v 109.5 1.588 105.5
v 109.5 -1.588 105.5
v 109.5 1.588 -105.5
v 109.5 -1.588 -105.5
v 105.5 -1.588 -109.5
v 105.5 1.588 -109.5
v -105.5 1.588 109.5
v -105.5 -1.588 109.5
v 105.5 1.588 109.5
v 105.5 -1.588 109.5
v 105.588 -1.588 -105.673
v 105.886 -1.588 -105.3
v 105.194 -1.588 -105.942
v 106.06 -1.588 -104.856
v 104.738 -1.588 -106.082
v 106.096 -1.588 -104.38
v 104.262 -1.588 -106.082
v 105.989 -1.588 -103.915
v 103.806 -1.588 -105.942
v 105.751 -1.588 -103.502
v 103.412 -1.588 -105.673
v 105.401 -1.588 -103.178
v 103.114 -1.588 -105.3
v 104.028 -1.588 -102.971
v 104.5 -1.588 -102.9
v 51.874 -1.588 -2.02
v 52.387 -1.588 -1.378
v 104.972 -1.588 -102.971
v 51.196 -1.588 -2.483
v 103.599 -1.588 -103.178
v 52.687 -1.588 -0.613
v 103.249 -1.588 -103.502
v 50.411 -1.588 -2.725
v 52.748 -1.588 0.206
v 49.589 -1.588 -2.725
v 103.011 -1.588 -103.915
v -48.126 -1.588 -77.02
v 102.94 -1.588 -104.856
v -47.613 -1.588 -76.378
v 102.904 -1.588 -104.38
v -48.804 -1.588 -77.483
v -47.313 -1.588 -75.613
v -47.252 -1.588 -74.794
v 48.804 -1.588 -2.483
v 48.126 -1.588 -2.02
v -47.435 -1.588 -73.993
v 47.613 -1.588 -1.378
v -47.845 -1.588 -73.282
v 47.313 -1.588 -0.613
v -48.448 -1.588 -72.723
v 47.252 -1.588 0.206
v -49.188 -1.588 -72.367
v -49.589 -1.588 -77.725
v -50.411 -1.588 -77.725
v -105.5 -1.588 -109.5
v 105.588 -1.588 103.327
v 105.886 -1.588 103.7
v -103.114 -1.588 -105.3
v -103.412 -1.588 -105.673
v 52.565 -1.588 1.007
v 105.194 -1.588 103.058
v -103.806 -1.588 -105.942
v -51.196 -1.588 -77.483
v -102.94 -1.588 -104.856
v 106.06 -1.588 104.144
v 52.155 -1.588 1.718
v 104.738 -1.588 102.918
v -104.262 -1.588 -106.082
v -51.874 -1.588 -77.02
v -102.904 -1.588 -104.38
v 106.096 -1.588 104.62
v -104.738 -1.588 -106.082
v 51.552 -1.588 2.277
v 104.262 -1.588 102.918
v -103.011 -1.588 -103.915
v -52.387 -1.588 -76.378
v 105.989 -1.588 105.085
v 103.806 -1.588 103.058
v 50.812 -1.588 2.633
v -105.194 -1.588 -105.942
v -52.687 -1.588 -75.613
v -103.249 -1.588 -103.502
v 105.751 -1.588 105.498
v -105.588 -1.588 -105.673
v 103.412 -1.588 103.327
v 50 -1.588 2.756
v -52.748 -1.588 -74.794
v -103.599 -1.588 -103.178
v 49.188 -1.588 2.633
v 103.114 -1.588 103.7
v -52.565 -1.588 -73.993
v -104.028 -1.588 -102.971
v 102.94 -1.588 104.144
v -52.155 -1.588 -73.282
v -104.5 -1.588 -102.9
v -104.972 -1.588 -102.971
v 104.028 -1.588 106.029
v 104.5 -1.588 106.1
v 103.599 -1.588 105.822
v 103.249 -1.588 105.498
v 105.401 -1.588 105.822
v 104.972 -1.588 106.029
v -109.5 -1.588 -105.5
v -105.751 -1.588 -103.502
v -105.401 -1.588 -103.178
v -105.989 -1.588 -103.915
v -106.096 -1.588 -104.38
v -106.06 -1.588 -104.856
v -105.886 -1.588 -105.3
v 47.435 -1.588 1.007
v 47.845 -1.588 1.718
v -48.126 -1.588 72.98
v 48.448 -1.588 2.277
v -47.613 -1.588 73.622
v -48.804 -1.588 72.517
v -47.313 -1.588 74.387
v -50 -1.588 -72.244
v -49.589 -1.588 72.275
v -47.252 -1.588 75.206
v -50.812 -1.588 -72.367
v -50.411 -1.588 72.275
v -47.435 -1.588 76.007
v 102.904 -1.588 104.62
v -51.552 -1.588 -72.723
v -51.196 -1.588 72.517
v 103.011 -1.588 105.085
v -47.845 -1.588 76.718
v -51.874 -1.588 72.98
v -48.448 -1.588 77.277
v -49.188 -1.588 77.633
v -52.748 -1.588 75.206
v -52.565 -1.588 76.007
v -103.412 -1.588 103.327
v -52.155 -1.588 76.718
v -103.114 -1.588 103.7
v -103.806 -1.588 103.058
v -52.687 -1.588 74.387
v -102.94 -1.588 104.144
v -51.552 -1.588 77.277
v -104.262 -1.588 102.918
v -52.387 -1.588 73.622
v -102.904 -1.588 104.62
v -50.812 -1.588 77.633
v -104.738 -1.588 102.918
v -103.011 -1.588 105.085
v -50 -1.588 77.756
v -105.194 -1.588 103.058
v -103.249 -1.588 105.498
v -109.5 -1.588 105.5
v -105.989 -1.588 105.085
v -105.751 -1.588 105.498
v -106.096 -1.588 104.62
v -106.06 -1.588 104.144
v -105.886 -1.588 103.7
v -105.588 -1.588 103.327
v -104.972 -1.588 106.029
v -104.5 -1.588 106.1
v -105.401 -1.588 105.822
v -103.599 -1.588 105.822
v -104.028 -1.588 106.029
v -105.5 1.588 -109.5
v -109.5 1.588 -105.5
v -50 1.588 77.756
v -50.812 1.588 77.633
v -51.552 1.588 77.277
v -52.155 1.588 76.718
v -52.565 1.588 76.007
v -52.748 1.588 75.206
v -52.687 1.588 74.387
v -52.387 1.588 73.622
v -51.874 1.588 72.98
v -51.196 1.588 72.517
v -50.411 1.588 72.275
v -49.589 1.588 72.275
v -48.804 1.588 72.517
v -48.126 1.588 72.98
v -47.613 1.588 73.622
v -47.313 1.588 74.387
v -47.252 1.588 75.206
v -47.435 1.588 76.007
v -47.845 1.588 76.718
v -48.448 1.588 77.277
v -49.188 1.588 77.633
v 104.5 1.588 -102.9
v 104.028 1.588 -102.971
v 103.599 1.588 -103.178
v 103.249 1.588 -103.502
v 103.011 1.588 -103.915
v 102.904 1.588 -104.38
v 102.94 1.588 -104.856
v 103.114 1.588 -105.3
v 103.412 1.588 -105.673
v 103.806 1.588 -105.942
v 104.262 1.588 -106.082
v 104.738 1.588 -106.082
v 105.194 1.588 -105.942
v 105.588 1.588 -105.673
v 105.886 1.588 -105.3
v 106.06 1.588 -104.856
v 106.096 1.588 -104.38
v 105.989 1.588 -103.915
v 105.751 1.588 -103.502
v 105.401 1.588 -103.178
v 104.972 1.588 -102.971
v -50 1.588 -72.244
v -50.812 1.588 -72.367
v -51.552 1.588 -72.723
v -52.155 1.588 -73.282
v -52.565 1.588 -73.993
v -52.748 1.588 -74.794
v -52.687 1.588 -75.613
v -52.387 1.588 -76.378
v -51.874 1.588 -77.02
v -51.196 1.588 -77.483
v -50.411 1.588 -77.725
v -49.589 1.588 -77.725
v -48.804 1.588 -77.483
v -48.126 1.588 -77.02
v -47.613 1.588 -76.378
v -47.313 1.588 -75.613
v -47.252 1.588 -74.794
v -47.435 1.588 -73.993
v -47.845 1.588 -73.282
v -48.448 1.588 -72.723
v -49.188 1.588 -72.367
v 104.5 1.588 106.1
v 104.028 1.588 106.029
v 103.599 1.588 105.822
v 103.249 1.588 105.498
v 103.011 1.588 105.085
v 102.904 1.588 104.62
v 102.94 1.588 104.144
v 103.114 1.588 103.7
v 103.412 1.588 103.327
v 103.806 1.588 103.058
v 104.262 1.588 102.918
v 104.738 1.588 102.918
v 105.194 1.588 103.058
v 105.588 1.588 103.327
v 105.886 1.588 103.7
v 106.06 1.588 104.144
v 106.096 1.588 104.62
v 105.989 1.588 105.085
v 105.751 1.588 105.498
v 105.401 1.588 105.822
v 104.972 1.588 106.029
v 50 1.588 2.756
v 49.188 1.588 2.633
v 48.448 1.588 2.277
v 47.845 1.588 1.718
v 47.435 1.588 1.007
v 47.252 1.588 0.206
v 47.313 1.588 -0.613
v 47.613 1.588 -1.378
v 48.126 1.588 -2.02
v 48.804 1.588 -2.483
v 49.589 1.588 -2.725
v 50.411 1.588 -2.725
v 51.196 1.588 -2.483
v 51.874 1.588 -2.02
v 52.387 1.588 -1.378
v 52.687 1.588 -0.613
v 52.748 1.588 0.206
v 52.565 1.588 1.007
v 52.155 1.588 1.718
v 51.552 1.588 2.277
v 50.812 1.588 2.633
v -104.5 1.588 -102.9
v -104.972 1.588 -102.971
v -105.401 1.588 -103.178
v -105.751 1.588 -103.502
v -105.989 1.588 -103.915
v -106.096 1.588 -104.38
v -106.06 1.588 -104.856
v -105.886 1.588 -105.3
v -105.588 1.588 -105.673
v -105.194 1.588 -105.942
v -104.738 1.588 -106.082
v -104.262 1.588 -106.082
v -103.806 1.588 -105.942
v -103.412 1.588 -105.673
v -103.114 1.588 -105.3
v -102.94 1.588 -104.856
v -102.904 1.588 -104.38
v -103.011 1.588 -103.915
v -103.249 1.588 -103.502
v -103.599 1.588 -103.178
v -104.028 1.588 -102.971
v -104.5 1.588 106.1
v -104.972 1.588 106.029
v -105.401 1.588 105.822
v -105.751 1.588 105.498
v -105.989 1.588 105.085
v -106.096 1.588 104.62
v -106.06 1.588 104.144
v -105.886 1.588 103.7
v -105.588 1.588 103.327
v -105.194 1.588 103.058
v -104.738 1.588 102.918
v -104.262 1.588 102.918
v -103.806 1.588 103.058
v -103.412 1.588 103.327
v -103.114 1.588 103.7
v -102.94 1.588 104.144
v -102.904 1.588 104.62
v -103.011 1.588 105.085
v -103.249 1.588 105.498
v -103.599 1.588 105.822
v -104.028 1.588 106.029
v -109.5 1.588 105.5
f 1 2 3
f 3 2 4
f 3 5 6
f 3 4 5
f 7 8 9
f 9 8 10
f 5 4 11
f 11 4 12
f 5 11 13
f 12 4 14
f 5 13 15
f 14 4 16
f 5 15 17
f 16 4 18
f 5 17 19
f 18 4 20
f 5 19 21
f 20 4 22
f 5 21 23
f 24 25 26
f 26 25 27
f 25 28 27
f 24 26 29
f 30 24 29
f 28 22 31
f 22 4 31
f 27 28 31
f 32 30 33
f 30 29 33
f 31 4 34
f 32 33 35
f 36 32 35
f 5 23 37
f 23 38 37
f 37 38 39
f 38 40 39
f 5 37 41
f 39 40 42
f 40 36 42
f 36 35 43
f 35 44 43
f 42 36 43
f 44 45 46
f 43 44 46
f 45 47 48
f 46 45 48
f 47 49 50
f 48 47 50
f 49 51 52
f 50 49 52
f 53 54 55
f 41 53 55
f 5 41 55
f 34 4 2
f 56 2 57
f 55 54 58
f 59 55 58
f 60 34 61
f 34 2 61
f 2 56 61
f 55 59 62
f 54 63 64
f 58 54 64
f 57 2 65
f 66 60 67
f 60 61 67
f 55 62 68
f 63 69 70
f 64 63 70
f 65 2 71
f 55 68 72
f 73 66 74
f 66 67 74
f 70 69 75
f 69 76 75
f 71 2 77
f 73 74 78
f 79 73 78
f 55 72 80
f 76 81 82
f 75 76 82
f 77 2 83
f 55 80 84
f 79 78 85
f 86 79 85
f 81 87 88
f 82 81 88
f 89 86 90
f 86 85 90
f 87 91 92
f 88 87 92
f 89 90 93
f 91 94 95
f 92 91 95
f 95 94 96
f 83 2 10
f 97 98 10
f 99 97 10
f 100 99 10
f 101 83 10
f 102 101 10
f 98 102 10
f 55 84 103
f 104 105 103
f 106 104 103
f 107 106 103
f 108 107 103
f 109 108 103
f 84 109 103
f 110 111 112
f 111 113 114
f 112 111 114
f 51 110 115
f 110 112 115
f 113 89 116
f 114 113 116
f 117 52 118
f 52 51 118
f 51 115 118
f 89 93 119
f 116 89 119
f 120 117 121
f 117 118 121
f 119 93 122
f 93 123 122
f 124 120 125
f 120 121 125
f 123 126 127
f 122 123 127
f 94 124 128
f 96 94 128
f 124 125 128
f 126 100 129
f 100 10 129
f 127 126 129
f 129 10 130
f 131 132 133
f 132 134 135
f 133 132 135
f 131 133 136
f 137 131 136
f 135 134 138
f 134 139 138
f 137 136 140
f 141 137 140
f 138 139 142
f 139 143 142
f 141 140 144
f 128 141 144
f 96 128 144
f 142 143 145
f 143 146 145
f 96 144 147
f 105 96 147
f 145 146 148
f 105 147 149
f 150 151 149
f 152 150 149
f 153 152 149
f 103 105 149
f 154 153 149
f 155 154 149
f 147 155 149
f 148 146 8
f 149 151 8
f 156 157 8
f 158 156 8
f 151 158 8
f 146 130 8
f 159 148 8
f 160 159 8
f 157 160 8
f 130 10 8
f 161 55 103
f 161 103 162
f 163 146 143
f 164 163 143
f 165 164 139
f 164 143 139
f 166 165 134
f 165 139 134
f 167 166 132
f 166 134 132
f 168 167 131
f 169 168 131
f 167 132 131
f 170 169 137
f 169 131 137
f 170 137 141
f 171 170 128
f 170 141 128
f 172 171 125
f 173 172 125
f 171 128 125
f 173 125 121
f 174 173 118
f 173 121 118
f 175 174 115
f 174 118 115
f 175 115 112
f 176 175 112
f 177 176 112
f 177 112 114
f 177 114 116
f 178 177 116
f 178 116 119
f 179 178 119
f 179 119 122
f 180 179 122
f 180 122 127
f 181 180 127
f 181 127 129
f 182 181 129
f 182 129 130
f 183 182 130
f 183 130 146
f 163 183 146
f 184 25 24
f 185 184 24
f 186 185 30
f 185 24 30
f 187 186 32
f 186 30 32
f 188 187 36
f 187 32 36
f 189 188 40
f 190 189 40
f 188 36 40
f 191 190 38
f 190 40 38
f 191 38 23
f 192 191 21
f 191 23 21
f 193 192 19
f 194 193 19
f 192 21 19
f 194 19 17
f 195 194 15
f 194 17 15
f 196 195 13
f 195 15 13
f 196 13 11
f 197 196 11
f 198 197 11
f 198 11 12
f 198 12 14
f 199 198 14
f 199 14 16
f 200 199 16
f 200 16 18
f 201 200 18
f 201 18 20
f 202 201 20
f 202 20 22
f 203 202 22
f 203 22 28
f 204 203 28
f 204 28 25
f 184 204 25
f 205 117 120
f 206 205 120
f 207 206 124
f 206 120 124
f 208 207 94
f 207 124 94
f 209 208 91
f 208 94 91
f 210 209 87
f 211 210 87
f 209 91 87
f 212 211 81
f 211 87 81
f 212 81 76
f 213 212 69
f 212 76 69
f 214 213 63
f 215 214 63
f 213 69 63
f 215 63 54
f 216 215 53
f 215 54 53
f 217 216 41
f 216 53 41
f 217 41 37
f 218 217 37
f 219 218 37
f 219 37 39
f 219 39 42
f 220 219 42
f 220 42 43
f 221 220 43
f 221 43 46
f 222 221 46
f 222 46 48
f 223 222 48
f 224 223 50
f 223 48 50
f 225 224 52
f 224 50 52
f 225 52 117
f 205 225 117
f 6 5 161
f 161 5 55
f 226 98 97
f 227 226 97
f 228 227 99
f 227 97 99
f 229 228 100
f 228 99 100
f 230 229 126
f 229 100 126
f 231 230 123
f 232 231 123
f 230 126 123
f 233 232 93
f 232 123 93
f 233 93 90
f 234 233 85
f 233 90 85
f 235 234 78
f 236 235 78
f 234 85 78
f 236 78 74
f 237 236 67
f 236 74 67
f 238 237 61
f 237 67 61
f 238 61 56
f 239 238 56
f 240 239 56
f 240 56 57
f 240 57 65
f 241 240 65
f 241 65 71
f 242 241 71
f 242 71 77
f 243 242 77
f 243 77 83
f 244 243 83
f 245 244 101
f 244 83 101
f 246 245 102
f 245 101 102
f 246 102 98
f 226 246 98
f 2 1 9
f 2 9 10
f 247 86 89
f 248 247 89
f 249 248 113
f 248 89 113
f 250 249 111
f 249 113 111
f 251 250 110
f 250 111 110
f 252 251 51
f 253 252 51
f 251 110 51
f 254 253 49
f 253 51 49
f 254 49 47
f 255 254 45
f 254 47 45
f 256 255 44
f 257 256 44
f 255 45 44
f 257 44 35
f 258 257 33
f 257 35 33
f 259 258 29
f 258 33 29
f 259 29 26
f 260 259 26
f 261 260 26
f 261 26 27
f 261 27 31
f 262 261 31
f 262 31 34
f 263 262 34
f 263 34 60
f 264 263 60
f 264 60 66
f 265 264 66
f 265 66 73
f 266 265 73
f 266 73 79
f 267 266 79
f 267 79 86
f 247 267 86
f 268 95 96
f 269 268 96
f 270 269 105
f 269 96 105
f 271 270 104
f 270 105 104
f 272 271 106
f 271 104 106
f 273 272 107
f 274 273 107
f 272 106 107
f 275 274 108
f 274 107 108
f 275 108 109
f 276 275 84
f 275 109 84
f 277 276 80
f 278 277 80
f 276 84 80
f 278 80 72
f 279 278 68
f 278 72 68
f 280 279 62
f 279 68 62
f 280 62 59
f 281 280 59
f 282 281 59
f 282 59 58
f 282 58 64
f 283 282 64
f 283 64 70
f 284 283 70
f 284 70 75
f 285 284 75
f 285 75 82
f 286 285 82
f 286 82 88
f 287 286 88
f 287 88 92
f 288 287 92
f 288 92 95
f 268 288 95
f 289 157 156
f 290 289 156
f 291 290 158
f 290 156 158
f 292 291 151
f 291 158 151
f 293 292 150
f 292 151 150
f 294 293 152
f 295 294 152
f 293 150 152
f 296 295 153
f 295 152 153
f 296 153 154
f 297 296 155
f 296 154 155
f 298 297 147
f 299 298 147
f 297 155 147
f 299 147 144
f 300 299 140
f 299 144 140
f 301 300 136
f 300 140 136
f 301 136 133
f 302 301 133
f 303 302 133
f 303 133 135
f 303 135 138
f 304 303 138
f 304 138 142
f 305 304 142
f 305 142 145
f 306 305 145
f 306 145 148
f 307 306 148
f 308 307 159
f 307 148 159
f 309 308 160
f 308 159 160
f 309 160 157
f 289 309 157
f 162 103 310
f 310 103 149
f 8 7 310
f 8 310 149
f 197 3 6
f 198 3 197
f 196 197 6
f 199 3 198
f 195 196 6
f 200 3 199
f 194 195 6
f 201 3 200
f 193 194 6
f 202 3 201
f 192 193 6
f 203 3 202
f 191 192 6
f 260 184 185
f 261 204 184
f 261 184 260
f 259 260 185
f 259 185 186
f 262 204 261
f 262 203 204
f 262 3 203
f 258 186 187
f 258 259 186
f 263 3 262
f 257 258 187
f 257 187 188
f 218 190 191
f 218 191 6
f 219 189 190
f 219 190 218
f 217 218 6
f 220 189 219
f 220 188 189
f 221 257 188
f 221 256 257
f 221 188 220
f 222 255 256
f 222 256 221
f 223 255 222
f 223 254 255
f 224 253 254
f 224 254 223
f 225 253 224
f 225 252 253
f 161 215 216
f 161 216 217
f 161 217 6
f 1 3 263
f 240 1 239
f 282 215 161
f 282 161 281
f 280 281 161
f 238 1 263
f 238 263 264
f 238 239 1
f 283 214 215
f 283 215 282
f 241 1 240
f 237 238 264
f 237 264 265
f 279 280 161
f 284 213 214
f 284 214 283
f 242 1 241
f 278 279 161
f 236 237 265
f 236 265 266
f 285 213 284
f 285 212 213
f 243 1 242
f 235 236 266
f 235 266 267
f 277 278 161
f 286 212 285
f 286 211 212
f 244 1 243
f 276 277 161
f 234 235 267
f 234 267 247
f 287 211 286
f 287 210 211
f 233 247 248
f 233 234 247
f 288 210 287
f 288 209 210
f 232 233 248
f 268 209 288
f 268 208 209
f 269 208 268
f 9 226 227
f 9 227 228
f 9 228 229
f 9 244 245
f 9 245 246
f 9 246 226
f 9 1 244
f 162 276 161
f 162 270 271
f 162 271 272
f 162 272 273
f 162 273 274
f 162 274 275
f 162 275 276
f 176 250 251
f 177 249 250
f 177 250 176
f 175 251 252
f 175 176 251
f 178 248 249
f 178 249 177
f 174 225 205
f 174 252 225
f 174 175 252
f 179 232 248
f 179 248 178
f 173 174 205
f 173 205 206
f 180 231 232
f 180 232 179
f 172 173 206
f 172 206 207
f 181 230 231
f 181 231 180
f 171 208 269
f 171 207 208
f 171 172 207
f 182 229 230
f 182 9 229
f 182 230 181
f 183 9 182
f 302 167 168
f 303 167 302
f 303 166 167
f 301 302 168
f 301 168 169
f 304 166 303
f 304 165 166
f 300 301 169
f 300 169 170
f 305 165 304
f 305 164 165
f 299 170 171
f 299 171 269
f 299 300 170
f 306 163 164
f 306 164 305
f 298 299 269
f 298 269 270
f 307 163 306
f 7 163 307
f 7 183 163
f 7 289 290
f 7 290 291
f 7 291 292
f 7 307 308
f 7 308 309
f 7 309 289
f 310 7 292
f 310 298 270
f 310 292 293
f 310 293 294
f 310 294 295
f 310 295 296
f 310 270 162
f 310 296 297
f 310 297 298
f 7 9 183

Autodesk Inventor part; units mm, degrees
ref_plane "YZ Plane" through (0, 0, 0) normal (1, 0, 0) x (0, 1, 0)
ref_plane "XZ Plane" through (0, 0, 0) normal (0, 1, 0) x (-1, 0, 0)
ref_plane "XY Plane" through (0, 0, 0) normal (0, 0, 1) x (1, 0, 0)
sketch "Sketch1" plane through (0, 0, 0) normal (0, 1, 0) x (-1, 0, 0)
  line L0 (109.5, 109.5) -> (-109.5, 109.5)
  line L1 (-109.5, 109.5) -> (-109.5, -109.5)
  line L2 (-109.5, -109.5) -> (109.5, -109.5)
  line L3 (109.5, -109.5) -> (109.5, 109.5)
  line L4 (109.5, 109.5) -> (-109.5, -109.5) construction
  line L5 (-109.5, 109.5) -> (109.5, -109.5) construction
  point P0 (0, 0)
  dimension "d0" = 219
extrude "Extrusion1" add sketch "Sketch1" along normal mid plane 3.175
chamfer "Chamfer1" distance 4 angle 45 4 edges at (-109.5, 0, 109.5) (-109.5, 0, -109.5) (109.5, 0, -109.5) (109.5, 0, 109.5)
sketch "Sketch3" plane through (0, 1.5875, 0) normal (0, 1, 0) x (1, 0, 0)
  line L0 (-104.5, -104.5) -> (104.5, -104.5) construction
  line L1 (104.5, -104.5) -> (104.5, 104.5) construction
  line L2 (104.5, 104.5) -> (-104.5, 104.5) construction
  line L3 (-104.5, 104.5) -> (-104.5, -104.5) construction
  line L4 (-104.5, -104.5) -> (104.5, 104.5) construction
  line L5 (104.5, -104.5) -> (-104.5, 104.5) construction
  line L6 (-78.5, 50) -> (-46.5, 50) construction
  line L7 (-78.5, -50) -> (-46.5, -50) construction
  line L8 (46.5, 0) -> (78.5, 0) construction
  point P0 (0, 0)
  point P1 (0, 0)
  dimension "d16" = 209
  dimension "d17" = 209
  dimension "d18" = 32
  dimension "d20" = 46.5
  dimension "d21" = 46.5
  dimension "d22" = 100
  dimension "d23" = 50
  dimension "d24" = 93
hole "Hole1" at (-104.5, 1.5875, -104.5) at (104.5, 1.5875, -104.5) at (104.5, 1.5875, 104.5) at (-104.5, 1.5875, 104.5) direction (0, -1, 0) diameter 3.2 end through all
sketch "Sketch4" plane through (0, 1.5875, 0) normal (0, 1, 0) x (1, 0, 0)
  line L0 (1.5, 22.5) -> (1.5, -22.5)
  line L1 (-109.5, 105.5) -> (-109.5, -105.5) projected
  point P0 (0, 0)
  point P1 (1.5, 0)
  point P2 (-50, 75)
  point P3 (50, 0)
  point P4 (-50, -75)
  dimension "d38" = 45
  dimension "d39" = 111
  dimension "d52" = 150
  dimension "d53" = 75
  dimension "d54" = 100
  dimension "d55" = 50
hole "Hole2" at (-50, 1.5875, 75) at (-50, 1.5875, -75) at (50, 1.5875, 0) direction (0, -1, 0) diameter 5.5118 depth 6.4 clearance for "Flat Head Machine Screw" size "M5" standard "Ansi Metric M Profile"
equation "\"d21\" = d20"
properties part number "Y-Carriage_Plate_LM3033_v2" material "Aluminum 6061"
